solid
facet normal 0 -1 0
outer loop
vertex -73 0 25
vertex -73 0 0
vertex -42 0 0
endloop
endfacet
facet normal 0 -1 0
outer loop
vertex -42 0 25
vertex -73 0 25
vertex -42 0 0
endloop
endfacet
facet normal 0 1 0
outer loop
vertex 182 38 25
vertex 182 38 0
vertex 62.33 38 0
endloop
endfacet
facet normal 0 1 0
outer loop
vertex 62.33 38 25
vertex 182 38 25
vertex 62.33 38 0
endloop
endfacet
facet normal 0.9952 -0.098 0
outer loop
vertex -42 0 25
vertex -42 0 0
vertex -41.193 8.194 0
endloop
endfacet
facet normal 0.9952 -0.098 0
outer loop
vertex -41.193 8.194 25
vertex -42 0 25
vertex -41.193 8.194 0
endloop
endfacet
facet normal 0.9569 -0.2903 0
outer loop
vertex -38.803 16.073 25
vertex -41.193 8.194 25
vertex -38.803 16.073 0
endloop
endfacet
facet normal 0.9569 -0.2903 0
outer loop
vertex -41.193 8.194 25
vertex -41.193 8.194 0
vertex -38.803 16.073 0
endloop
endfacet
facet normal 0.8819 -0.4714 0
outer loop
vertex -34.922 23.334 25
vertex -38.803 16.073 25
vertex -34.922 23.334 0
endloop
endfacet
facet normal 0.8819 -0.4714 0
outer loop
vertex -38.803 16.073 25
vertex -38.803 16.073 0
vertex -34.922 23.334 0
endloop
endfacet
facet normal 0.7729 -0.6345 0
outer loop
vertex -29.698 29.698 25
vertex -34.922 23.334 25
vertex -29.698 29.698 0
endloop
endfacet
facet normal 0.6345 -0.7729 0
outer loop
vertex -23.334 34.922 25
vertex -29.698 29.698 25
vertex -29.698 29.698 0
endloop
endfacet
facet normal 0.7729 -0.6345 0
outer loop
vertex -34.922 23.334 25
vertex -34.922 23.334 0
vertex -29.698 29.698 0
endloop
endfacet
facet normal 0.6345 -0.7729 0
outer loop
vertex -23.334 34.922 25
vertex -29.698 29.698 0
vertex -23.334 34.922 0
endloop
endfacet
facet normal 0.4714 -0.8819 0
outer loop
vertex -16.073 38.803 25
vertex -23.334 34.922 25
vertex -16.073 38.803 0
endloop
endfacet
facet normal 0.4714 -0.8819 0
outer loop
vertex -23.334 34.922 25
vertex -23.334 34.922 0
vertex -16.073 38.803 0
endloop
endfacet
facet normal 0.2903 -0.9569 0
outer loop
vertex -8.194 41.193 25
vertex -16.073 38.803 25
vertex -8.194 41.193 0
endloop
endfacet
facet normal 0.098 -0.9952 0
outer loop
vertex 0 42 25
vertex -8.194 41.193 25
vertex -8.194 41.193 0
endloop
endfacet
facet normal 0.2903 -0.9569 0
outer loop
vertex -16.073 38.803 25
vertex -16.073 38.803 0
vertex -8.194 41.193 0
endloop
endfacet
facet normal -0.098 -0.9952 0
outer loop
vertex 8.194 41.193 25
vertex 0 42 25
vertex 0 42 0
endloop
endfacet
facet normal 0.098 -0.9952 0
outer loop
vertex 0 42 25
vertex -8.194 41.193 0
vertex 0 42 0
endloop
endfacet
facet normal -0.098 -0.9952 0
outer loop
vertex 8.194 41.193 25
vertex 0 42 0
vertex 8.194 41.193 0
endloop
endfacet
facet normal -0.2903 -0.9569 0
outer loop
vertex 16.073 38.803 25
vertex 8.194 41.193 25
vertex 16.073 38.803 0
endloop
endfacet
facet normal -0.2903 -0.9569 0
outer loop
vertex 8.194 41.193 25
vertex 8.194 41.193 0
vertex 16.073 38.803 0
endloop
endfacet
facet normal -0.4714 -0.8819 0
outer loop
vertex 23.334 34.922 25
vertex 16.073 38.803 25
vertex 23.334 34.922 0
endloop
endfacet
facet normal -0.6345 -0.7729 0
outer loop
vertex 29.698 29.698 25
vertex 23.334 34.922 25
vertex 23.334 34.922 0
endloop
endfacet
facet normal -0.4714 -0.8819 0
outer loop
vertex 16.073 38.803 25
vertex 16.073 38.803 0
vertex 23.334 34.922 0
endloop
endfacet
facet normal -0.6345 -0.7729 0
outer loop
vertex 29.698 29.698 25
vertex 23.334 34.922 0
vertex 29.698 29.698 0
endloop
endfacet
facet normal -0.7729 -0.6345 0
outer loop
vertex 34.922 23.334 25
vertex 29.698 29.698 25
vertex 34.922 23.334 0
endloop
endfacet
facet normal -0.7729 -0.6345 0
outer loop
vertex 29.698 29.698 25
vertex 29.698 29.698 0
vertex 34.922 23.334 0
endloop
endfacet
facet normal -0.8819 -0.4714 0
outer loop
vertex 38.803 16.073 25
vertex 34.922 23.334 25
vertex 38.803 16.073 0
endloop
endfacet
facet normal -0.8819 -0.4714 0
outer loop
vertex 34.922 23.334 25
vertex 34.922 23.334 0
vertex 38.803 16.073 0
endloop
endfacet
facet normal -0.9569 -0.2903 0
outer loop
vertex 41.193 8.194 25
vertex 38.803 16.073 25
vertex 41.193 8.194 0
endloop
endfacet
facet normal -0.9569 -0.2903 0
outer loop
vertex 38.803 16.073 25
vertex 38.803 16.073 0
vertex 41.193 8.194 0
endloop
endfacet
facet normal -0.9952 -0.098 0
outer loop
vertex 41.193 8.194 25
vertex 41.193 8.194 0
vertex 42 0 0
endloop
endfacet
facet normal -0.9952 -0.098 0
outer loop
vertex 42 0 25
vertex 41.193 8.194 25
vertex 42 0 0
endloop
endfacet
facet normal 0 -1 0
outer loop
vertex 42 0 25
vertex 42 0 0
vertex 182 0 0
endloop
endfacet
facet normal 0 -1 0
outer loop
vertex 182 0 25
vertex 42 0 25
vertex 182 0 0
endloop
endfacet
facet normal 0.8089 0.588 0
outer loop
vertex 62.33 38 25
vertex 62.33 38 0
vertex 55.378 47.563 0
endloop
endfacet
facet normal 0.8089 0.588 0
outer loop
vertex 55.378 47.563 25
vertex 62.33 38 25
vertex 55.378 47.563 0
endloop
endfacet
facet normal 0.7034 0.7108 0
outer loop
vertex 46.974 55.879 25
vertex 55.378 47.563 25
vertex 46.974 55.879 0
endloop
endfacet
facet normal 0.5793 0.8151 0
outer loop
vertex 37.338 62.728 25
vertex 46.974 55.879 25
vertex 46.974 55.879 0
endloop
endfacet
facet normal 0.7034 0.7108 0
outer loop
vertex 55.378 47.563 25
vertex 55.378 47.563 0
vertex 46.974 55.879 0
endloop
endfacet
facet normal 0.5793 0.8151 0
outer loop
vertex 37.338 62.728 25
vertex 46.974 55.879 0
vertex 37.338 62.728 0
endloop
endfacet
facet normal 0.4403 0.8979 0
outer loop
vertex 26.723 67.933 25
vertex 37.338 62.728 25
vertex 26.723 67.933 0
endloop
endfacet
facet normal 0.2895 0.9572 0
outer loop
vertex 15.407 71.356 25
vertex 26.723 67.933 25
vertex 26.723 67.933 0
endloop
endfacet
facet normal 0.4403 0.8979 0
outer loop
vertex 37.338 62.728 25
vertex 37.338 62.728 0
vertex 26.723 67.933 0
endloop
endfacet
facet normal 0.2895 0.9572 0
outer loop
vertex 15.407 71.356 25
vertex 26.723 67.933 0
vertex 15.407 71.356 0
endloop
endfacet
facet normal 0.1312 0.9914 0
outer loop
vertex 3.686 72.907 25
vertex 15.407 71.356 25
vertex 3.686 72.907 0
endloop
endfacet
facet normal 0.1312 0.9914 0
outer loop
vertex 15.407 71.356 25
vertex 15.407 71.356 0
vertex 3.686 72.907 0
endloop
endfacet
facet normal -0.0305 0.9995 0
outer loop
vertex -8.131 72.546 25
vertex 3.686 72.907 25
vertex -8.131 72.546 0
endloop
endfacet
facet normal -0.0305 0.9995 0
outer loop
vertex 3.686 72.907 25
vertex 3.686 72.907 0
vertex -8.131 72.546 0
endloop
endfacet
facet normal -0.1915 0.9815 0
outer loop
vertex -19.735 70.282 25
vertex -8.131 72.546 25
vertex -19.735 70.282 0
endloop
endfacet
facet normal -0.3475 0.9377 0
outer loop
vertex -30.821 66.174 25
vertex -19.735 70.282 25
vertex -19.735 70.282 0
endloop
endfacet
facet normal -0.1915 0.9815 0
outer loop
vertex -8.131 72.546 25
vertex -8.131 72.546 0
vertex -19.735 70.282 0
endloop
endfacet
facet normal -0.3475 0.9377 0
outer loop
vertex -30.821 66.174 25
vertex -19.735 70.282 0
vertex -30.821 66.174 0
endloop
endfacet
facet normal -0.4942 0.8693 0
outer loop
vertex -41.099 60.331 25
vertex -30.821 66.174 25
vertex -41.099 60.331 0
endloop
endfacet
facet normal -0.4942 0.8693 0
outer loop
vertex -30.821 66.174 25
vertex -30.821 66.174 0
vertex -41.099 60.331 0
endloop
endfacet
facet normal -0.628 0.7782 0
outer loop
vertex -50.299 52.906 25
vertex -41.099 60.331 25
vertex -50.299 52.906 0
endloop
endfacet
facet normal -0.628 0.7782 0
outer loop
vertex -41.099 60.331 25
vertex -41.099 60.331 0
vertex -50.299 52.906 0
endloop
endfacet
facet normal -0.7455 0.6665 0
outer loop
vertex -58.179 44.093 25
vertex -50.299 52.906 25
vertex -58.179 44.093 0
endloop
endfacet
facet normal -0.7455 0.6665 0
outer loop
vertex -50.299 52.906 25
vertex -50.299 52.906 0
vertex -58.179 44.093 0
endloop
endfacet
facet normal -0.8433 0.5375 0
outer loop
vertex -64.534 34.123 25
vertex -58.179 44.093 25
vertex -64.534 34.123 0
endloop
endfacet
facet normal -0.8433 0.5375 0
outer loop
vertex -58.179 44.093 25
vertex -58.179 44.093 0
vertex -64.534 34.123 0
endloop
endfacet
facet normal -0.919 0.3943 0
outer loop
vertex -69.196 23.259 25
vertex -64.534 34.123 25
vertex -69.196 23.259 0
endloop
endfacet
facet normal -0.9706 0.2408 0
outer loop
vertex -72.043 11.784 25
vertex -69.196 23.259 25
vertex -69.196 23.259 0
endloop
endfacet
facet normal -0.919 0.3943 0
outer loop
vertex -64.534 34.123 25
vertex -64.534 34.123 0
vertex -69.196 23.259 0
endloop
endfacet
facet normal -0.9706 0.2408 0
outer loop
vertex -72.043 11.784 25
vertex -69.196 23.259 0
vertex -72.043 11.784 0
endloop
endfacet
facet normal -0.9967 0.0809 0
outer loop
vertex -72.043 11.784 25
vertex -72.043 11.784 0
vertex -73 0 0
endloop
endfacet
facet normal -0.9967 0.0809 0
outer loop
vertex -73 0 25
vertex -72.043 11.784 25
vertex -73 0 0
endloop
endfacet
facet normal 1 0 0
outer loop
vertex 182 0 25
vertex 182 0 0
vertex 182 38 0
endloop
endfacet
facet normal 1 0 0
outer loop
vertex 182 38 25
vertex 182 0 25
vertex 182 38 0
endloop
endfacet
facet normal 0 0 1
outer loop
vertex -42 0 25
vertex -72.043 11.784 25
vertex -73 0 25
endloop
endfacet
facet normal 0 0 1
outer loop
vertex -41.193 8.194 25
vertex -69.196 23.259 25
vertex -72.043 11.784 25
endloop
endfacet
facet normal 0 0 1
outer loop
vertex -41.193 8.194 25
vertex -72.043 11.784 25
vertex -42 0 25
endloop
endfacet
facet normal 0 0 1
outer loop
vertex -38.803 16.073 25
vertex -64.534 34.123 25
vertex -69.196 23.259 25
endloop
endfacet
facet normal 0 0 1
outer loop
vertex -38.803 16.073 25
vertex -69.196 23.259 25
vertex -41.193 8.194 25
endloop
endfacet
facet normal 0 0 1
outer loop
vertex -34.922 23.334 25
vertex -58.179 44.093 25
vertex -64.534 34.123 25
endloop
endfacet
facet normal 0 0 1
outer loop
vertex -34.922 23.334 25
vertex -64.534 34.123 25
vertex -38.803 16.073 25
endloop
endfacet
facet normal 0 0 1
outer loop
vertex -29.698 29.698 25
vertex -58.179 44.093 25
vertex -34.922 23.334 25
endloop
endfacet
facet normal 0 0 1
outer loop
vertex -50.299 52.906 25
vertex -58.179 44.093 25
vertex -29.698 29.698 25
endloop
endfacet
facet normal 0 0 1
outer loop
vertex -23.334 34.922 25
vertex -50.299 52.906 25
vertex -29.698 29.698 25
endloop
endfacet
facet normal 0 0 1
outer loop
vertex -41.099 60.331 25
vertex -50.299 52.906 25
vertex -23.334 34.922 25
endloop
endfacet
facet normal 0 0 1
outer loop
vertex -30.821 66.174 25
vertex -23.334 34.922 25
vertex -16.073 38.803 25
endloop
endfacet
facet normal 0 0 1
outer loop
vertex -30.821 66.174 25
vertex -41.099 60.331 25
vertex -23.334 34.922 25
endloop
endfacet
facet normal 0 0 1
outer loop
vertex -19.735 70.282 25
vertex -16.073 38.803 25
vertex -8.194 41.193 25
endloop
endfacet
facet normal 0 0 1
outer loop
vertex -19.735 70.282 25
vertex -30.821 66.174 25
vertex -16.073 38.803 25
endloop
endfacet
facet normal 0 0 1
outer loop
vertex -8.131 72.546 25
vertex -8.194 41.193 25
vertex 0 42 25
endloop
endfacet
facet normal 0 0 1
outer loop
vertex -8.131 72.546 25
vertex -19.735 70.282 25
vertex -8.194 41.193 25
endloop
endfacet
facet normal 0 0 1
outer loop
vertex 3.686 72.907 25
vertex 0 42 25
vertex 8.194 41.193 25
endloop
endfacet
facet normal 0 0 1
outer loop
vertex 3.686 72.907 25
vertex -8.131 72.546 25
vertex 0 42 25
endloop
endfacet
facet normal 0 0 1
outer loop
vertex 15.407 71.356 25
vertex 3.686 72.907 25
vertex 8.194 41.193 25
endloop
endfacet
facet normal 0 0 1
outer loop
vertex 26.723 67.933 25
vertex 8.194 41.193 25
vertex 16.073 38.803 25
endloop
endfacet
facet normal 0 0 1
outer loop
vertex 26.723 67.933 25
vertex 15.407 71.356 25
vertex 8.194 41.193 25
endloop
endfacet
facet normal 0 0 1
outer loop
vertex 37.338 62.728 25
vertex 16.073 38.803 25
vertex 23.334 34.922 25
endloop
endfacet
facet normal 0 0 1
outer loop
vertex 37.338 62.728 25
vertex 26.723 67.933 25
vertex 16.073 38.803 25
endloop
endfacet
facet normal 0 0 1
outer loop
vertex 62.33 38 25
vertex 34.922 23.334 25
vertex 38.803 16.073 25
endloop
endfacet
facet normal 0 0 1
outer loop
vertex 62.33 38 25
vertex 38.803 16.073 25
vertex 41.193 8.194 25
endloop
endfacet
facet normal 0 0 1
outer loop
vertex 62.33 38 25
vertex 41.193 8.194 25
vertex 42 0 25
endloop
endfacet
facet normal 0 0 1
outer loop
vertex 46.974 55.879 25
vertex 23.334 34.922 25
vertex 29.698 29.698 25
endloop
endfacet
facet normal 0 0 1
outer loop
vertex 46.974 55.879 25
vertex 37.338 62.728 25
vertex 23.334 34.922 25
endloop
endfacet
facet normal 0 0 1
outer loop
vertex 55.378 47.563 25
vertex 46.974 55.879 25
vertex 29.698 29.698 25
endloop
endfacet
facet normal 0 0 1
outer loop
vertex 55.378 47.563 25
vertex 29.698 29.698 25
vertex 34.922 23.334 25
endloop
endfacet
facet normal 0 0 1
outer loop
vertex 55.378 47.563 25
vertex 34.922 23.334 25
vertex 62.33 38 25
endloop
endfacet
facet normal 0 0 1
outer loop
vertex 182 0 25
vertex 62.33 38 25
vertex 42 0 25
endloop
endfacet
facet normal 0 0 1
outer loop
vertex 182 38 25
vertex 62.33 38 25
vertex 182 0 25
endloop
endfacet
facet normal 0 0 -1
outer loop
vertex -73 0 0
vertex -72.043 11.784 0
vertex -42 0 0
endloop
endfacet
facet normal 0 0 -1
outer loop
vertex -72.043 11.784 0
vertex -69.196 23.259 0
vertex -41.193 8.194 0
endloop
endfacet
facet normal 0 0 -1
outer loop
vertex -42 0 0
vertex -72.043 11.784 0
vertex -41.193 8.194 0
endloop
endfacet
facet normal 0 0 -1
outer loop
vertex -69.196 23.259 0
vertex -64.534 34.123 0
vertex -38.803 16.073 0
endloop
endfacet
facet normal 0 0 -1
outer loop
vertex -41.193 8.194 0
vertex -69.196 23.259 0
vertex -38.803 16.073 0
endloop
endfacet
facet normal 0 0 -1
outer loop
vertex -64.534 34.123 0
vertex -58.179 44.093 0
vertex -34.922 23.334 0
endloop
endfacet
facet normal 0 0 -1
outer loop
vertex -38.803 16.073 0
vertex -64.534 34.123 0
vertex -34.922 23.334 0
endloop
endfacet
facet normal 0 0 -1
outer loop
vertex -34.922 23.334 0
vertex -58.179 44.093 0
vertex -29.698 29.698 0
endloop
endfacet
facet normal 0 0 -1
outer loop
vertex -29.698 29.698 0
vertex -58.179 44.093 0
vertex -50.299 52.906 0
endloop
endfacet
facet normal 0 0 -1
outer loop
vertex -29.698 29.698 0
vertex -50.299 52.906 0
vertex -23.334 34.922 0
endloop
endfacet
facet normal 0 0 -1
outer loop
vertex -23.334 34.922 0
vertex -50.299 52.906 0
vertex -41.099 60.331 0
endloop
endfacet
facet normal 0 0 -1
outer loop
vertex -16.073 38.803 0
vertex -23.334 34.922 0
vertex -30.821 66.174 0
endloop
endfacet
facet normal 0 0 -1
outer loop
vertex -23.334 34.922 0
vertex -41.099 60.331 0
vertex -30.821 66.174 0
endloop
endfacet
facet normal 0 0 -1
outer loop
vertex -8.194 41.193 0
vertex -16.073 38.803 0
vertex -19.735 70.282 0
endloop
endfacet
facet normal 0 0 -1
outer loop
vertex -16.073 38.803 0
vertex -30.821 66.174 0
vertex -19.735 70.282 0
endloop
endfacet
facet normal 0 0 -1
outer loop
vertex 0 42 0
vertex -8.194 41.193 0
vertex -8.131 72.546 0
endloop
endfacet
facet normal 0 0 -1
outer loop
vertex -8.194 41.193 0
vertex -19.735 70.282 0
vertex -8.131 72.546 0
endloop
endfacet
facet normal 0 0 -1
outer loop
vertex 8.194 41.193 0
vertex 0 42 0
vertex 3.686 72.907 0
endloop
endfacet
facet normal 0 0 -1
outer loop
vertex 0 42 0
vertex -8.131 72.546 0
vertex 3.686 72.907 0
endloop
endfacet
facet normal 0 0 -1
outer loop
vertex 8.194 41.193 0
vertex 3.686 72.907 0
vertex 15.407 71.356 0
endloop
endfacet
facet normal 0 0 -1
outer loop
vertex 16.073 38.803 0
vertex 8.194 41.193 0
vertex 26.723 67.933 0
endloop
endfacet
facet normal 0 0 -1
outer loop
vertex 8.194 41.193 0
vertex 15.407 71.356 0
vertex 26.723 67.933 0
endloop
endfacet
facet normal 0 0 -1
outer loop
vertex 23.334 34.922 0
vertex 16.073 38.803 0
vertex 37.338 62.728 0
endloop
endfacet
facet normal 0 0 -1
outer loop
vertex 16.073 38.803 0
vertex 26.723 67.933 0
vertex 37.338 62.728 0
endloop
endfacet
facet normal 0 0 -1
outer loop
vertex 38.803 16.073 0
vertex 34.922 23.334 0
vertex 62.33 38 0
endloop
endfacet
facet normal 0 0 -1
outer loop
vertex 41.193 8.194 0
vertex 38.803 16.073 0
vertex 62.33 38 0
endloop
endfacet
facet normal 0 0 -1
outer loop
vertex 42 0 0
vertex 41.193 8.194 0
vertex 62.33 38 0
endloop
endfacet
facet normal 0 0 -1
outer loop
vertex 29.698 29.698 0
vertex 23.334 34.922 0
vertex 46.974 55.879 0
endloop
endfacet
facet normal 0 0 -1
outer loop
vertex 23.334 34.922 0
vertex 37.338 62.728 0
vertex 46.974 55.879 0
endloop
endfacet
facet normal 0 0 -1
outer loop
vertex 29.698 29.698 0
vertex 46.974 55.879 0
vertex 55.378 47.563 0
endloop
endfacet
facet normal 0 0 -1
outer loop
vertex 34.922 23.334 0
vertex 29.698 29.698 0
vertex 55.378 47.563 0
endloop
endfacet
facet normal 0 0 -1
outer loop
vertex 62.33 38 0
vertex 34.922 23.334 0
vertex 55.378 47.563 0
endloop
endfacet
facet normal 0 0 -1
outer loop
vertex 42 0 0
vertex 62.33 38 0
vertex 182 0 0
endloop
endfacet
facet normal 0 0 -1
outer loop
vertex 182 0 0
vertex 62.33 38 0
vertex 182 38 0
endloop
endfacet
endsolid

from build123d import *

# Parameters (mm, degrees)
F1_DEPTH = 25


with BuildPart() as f1:
    # F0 (on Top) → F1 (new body)
    with BuildSketch(Plane.XY):
        with BuildLine():
            ThreePointArc((-42, 0), (0, 42), (42, 0))
            Line((42, 0), (62.329768, 0))
            Line((62.329768, 0), (73, 0))
            Line((73, 0), (182, 0))
            Line((182, 0), (182, 38))
            Line((182, 38), (62.329768, 38))
            ThreePointArc((62.329768, 38), (-19.734829, 70.281836), (-73, 0))
            Line((-73, 0), (-42, 0))
        make_face()
    extrude(amount=F1_DEPTH)


solid = f1.part
